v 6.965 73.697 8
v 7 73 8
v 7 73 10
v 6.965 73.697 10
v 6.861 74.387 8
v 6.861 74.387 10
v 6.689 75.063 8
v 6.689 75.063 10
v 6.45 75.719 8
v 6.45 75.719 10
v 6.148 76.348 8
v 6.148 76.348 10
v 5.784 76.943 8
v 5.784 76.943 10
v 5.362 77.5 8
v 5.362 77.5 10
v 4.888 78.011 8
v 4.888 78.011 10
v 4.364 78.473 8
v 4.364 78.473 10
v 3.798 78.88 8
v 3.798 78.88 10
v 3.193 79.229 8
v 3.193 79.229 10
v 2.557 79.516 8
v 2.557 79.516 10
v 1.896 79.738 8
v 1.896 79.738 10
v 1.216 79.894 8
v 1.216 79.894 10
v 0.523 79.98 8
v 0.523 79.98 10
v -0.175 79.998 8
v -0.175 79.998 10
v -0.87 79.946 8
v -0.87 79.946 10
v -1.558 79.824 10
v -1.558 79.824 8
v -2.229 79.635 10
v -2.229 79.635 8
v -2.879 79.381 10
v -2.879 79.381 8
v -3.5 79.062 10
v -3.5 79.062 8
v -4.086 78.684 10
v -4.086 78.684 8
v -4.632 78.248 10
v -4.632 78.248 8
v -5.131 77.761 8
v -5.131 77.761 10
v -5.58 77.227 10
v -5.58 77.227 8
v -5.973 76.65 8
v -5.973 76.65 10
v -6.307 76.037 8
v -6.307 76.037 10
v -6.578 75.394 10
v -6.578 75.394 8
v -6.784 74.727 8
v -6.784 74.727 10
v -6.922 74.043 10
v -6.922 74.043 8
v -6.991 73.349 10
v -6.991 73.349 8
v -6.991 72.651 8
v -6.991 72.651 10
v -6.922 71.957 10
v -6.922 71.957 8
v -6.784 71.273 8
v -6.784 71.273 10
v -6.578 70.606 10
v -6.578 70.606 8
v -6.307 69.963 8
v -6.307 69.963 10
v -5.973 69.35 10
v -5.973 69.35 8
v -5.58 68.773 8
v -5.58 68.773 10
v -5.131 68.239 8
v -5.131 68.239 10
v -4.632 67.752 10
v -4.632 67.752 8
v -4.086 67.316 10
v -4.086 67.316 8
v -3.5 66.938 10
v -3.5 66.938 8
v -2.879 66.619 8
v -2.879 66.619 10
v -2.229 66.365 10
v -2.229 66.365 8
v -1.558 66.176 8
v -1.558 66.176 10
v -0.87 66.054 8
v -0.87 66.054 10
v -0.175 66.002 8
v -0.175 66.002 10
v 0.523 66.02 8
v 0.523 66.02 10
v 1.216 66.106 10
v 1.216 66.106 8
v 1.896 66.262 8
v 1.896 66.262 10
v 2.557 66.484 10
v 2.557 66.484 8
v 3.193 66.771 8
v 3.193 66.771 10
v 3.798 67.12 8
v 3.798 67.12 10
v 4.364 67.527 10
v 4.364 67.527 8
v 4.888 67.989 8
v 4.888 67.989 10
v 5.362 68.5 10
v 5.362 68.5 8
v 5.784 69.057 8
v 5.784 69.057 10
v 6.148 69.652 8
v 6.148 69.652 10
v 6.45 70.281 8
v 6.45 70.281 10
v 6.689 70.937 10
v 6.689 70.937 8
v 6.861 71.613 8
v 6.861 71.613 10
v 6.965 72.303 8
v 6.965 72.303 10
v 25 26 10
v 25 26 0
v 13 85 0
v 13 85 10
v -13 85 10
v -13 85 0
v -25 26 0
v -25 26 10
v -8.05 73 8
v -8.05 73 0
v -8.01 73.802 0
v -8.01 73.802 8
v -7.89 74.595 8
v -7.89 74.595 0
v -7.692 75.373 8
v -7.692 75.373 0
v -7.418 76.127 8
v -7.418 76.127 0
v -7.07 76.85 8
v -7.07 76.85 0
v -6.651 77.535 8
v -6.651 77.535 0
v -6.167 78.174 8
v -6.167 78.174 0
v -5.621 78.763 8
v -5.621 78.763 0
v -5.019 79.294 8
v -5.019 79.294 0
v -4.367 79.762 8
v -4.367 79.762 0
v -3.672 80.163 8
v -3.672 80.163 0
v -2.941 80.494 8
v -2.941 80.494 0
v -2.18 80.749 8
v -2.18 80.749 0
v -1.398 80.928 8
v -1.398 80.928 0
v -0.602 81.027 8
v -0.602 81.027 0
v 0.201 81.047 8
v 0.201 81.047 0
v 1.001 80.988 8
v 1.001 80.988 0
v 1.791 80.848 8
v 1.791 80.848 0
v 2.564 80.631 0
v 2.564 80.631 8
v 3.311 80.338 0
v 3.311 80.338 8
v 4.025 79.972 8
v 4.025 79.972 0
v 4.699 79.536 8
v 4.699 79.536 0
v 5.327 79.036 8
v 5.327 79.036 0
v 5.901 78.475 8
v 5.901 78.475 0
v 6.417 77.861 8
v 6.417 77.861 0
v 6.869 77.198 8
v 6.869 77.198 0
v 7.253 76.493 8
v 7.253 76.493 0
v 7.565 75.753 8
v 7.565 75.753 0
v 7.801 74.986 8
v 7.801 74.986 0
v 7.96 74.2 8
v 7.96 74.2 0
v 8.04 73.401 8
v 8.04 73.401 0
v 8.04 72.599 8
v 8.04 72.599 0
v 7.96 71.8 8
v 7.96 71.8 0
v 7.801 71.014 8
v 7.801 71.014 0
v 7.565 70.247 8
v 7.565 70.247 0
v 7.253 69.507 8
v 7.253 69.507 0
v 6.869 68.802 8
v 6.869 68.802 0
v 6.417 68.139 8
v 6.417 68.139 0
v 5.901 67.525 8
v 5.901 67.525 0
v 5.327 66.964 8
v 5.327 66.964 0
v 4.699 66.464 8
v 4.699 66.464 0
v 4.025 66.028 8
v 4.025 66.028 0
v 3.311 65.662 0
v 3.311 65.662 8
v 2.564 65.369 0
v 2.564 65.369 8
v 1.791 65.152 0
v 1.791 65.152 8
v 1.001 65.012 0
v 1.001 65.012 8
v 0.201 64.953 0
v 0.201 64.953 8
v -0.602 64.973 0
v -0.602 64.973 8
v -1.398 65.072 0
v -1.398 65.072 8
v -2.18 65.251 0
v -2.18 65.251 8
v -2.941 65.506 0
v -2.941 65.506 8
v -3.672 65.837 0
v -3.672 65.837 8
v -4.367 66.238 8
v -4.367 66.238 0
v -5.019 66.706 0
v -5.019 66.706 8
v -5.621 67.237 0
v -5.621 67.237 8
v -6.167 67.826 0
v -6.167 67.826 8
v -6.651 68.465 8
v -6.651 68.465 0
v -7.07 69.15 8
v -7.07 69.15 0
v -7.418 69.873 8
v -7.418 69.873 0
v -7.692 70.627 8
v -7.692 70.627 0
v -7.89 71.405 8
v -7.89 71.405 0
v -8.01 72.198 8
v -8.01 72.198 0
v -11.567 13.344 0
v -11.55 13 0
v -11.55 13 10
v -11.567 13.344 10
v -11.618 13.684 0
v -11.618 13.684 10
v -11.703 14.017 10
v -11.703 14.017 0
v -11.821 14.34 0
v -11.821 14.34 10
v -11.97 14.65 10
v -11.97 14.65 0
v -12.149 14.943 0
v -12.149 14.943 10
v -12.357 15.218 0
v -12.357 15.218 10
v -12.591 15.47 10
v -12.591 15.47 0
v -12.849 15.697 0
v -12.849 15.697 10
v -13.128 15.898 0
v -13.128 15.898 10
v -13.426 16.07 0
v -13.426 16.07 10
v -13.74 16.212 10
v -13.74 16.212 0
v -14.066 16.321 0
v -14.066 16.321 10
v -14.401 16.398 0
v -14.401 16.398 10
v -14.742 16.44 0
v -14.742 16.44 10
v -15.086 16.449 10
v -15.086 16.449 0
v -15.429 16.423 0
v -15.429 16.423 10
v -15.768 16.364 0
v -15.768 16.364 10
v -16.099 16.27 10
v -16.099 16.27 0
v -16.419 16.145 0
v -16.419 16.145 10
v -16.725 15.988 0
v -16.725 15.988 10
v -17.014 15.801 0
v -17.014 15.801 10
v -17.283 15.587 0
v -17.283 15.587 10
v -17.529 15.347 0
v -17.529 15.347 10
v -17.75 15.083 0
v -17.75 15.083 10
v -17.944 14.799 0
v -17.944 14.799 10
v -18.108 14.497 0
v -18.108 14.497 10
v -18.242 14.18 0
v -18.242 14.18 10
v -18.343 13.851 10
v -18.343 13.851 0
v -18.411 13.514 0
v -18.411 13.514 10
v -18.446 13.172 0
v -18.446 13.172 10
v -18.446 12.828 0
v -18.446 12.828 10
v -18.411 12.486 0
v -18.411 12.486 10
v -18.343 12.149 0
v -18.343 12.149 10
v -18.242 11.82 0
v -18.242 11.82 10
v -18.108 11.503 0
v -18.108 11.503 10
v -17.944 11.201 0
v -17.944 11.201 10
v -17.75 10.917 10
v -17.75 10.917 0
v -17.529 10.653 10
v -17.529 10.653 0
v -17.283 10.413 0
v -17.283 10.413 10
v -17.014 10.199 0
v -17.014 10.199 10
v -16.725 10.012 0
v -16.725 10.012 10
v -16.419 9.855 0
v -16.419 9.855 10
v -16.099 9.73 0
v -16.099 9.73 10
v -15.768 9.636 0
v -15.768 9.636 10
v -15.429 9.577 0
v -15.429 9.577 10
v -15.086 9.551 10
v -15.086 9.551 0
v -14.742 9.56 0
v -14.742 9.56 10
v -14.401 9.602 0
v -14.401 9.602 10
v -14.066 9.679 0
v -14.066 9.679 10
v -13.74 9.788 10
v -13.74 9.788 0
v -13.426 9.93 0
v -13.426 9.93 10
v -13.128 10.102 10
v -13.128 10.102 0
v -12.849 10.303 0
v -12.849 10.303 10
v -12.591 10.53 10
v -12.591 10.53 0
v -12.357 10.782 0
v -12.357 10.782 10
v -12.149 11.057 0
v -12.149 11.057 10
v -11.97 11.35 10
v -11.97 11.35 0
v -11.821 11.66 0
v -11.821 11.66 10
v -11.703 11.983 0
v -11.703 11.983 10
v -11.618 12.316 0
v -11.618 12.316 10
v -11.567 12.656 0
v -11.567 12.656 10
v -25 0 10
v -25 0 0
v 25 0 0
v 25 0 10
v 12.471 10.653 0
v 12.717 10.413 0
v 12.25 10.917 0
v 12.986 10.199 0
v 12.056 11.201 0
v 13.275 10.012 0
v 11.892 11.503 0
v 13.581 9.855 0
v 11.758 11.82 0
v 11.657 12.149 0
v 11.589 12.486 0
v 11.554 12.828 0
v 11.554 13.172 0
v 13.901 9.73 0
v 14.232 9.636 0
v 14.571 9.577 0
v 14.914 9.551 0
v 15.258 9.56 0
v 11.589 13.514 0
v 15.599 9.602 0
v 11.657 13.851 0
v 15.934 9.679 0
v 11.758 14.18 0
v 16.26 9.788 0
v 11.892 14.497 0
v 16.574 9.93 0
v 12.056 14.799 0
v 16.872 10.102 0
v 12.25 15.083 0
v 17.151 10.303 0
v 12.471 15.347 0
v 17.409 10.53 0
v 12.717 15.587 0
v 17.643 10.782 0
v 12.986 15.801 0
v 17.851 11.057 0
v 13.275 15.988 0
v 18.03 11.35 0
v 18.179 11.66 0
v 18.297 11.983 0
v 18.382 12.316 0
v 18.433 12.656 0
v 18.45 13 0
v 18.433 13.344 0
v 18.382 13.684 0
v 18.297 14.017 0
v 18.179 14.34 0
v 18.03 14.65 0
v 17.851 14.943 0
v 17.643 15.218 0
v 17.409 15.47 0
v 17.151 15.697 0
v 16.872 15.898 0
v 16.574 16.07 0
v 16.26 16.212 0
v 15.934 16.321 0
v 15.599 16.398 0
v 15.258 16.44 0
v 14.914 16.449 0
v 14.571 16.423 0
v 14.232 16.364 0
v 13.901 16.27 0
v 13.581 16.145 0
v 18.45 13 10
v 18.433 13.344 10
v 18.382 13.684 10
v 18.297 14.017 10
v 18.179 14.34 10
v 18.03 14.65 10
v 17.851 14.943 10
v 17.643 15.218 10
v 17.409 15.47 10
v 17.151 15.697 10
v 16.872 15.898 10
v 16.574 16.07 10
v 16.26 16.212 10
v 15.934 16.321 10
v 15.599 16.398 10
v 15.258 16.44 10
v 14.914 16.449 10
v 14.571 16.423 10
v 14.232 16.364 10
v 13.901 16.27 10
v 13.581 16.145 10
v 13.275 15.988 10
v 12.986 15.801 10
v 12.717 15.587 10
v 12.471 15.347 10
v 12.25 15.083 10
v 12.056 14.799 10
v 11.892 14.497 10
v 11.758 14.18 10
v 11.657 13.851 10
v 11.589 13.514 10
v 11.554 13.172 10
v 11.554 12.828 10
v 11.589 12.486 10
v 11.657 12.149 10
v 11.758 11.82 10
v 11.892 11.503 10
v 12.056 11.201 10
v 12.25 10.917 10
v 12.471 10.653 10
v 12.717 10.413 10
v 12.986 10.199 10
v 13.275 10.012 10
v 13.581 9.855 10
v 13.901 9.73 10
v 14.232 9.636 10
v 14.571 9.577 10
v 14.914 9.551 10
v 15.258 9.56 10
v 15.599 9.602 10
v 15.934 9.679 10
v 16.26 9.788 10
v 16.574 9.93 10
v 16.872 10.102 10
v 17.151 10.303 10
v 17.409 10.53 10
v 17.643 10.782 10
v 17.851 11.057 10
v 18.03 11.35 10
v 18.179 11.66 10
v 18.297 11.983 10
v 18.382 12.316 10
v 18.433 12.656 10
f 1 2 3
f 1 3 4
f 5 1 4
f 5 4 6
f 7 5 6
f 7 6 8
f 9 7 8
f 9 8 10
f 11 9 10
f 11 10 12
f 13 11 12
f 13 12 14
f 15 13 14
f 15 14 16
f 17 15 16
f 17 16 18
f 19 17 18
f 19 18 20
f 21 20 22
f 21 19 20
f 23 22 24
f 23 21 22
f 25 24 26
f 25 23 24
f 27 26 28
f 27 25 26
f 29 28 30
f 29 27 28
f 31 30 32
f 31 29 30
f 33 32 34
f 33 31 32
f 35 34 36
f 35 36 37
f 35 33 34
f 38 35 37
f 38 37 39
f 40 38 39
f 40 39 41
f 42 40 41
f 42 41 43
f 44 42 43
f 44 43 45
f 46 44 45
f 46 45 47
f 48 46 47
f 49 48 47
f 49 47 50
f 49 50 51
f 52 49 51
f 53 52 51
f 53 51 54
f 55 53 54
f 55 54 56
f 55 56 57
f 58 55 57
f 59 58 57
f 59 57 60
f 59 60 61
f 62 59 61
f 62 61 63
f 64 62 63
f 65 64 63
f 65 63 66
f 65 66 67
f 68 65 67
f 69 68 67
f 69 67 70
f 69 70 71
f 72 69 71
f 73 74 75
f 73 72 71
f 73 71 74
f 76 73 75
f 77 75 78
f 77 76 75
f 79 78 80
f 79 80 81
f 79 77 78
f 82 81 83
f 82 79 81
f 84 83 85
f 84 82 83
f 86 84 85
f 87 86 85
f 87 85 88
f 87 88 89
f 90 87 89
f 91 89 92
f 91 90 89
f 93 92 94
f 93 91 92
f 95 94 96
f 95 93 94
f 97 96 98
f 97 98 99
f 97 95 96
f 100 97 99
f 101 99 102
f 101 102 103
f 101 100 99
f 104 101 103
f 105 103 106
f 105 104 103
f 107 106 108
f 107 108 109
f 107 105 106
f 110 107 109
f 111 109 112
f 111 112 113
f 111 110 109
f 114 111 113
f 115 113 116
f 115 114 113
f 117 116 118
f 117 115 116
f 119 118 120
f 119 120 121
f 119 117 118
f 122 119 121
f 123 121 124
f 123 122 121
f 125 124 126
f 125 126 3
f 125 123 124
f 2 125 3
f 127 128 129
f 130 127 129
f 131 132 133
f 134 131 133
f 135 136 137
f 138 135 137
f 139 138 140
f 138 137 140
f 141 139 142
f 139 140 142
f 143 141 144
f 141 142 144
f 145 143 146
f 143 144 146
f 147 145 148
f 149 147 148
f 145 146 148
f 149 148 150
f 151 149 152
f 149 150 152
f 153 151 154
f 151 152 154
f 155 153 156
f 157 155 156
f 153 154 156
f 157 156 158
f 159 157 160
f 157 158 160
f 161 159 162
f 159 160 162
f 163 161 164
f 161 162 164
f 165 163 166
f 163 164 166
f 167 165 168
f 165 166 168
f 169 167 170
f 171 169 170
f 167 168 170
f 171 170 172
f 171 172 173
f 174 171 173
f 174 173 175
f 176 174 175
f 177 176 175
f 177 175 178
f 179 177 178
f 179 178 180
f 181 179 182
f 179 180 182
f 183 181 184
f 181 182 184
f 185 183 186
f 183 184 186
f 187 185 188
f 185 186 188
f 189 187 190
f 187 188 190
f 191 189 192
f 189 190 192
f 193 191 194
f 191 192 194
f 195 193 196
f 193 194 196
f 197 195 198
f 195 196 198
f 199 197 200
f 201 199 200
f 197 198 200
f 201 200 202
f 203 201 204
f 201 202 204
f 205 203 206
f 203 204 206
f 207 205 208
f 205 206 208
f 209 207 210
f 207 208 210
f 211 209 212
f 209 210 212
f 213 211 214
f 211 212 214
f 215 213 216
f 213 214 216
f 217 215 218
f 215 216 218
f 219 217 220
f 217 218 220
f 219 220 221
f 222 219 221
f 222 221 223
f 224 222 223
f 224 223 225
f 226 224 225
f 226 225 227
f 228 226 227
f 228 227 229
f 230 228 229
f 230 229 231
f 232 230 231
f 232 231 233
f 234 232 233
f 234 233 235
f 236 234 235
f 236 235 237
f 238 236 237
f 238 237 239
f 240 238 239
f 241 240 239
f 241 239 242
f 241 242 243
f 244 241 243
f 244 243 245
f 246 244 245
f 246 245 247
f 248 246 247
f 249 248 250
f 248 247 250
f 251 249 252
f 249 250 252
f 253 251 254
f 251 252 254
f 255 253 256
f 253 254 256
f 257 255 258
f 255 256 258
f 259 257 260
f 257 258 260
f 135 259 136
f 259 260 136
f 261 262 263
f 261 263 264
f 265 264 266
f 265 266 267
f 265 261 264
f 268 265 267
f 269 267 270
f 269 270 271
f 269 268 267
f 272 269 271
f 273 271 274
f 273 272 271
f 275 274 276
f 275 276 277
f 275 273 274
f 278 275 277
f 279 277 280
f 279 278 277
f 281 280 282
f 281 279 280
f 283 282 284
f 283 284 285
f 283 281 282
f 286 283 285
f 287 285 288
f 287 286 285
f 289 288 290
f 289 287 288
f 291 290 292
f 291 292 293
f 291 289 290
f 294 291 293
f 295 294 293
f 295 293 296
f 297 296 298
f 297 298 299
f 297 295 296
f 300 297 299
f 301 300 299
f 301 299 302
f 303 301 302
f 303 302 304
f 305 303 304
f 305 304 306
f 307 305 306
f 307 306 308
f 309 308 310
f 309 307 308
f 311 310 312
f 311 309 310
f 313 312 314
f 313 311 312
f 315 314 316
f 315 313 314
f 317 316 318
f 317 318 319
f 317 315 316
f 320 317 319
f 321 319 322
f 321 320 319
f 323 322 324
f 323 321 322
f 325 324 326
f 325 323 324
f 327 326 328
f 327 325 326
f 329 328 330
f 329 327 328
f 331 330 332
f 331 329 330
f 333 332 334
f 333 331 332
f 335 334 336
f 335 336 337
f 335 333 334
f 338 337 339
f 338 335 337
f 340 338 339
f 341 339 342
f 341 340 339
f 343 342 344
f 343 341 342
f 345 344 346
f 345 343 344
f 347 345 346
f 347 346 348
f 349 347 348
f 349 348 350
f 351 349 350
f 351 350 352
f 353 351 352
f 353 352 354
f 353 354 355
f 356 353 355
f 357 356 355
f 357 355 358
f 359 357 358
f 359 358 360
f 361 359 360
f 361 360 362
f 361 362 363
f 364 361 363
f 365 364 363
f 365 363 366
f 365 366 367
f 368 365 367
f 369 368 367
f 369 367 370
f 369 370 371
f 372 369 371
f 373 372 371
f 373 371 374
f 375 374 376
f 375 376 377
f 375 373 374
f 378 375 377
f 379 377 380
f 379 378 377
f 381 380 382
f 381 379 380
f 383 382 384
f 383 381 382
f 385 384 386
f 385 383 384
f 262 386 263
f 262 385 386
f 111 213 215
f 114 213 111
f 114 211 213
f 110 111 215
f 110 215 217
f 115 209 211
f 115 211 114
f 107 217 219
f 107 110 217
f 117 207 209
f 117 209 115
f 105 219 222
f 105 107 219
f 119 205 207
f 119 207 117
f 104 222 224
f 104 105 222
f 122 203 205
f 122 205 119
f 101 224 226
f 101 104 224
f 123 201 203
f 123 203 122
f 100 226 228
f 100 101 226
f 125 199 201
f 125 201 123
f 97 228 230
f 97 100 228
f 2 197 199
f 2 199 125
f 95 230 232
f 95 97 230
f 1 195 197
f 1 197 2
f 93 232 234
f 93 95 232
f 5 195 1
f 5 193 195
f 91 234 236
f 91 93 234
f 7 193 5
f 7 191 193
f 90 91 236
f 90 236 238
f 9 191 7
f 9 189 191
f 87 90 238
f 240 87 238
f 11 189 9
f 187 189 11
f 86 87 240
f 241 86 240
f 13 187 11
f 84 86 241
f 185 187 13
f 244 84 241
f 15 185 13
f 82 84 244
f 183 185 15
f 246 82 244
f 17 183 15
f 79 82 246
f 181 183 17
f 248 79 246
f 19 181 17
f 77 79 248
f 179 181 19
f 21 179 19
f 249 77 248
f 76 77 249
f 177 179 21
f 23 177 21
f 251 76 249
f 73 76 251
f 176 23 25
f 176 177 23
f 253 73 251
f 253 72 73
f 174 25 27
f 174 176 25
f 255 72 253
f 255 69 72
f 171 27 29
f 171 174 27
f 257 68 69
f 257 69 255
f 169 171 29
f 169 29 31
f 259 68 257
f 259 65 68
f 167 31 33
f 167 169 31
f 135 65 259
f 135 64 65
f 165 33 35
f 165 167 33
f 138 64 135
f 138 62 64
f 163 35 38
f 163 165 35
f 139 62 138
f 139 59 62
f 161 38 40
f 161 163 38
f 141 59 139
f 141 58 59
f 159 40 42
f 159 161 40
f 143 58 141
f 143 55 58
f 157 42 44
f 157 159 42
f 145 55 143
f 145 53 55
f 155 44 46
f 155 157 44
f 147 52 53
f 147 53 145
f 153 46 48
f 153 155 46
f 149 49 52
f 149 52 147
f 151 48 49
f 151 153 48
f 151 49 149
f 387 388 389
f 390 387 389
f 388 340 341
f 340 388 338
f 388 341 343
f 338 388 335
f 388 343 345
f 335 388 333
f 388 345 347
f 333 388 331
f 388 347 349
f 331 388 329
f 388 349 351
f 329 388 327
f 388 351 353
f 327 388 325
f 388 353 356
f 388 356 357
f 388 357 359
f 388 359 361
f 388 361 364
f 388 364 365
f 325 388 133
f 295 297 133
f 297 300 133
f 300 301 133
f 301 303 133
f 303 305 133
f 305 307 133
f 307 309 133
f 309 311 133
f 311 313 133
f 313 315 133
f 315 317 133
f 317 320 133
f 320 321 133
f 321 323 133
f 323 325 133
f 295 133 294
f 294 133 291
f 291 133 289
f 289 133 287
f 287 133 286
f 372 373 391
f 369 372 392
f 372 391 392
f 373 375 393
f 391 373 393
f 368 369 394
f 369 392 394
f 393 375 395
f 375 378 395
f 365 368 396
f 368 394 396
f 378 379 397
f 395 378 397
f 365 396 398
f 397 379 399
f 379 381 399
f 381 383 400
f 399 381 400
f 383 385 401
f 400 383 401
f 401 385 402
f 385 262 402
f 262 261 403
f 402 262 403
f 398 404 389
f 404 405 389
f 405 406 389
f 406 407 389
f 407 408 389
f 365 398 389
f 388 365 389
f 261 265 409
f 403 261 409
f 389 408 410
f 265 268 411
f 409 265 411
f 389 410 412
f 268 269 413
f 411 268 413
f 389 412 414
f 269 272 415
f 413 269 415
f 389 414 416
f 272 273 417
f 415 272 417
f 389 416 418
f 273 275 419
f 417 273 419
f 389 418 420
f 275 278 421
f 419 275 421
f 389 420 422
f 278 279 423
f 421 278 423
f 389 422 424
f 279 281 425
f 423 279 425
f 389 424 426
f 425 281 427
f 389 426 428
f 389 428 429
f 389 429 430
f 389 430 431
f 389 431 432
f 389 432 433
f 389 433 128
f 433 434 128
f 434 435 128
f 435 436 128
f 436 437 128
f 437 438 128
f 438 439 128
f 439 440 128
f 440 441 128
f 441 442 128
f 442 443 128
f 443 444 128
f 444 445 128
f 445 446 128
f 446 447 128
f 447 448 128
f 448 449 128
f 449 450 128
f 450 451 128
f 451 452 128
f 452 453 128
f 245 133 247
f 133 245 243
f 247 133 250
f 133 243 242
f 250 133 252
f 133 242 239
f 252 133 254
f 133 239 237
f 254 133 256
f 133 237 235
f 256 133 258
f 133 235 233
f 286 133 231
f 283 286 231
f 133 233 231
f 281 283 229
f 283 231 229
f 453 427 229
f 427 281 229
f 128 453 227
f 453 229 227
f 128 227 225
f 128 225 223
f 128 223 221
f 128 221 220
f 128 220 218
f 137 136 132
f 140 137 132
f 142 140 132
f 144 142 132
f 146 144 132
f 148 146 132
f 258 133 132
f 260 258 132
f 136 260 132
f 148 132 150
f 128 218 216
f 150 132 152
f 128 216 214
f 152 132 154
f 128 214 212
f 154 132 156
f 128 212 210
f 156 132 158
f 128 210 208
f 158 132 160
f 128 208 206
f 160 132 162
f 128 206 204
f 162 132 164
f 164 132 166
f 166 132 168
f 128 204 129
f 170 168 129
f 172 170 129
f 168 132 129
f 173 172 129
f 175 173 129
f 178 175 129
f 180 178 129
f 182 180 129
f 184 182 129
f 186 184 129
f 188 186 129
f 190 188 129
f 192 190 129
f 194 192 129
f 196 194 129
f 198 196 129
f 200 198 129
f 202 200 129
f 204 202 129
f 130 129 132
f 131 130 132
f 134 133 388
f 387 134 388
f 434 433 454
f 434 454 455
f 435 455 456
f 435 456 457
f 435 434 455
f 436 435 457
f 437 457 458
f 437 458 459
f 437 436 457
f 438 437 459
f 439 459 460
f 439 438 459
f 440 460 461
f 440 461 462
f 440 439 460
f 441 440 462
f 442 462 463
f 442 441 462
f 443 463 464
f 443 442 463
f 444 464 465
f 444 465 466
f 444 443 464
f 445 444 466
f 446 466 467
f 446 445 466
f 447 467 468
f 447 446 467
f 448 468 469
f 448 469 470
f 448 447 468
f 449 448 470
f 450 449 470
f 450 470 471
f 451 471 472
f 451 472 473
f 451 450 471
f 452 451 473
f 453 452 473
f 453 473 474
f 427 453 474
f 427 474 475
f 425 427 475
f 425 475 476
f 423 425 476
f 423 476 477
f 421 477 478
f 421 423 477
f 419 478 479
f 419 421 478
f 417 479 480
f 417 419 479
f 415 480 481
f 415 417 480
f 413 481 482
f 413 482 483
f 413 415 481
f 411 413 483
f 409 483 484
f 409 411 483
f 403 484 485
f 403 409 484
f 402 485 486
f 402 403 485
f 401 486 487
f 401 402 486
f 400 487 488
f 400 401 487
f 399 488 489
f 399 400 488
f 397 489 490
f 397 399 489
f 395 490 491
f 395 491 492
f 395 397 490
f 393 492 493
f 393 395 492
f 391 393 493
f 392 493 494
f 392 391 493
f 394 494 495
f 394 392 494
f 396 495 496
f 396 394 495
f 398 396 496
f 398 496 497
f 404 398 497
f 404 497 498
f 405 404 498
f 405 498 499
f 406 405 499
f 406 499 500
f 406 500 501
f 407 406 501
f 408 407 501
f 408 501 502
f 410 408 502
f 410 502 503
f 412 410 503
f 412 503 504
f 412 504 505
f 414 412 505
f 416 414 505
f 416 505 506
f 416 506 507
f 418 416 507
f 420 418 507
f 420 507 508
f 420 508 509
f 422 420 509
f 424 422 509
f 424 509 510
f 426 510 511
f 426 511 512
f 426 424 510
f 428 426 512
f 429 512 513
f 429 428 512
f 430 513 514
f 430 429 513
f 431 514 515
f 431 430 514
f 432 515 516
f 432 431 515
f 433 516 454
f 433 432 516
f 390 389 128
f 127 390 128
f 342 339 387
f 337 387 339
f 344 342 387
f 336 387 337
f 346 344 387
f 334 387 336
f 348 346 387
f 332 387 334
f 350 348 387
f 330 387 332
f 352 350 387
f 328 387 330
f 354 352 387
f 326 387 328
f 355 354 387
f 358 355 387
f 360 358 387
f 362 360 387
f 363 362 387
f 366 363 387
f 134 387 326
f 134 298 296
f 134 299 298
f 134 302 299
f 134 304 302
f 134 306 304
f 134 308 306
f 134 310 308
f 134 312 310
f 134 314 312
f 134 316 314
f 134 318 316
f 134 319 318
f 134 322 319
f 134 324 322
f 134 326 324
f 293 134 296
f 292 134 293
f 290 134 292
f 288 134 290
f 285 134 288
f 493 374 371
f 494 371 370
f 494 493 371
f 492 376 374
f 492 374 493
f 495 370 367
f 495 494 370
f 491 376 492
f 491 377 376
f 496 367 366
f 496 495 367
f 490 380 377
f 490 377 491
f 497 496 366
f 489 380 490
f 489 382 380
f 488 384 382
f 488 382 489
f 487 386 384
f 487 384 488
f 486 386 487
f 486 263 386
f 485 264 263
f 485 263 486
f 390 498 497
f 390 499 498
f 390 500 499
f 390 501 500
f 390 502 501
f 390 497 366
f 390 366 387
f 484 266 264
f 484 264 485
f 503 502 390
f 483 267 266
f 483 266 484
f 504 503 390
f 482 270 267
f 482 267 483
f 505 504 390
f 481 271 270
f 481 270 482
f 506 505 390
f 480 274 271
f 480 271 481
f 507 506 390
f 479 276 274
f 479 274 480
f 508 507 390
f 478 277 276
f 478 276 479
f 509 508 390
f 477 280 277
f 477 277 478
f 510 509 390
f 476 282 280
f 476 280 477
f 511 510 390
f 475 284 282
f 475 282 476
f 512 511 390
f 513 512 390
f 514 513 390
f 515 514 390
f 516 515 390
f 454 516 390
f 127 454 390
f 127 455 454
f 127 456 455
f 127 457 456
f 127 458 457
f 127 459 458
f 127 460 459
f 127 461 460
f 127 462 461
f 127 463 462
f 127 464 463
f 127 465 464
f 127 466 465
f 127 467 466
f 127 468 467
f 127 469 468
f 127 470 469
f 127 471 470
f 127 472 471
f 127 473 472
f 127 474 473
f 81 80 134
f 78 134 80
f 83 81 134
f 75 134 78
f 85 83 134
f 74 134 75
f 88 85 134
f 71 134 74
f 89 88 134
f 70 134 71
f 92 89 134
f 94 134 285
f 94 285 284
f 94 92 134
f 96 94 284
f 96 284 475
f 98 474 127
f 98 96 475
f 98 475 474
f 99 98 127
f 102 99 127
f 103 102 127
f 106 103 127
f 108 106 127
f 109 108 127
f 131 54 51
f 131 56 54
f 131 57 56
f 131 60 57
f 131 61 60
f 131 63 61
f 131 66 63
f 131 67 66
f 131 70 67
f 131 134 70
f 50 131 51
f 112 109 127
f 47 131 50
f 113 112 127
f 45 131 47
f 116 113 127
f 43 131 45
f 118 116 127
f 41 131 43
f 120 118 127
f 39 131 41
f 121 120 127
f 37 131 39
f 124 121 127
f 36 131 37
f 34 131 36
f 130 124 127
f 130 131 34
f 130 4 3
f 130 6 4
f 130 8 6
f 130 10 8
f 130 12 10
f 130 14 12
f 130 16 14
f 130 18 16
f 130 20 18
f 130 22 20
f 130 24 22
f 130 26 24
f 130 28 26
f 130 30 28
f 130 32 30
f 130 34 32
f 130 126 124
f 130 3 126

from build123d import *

# Parameters (mm, degrees)
SKETCH_1_R          = 7
SKETCH_1_R_2        = 3.45
EXTRUDE_1_DEPTH     = 10
SKETCH_2_R          = 8.05
SKETCH_2_R_2        = 4
CUT_EXTRUDE_1_DEPTH = 8


with BuildPart() as part:
    # 草图1 → 凸台-拉伸1 (new body)
    with BuildSketch(Plane.XY):
        Polygon((-25, 0), (25, 0), (25, 26), (13, 85), (-13, 85), (-25, 26), align=None)
        with Locations((0, 73)):
            Circle(SKETCH_1_R, mode=Mode.SUBTRACT)
        with Locations((-15, 13)):
            Circle(SKETCH_1_R_2, mode=Mode.SUBTRACT)
        with Locations((15, 13)):
            Circle(SKETCH_1_R_2, mode=Mode.SUBTRACT)
    extrude(amount=EXTRUDE_1_DEPTH)

    # 草图2 → 切除-拉伸1 (cut)
    with BuildSketch(Plane(origin=(0, 0, 0), x_dir=(-1, 0, 0), z_dir=(0, 0, -1))):
        with Locations((0, 73)):
            Circle(SKETCH_2_R)
        with Locations((0, 73)):
            Circle(SKETCH_2_R_2, mode=Mode.SUBTRACT)
    extrude(amount=-CUT_EXTRUDE_1_DEPTH, mode=Mode.SUBTRACT)


solid = part.part
